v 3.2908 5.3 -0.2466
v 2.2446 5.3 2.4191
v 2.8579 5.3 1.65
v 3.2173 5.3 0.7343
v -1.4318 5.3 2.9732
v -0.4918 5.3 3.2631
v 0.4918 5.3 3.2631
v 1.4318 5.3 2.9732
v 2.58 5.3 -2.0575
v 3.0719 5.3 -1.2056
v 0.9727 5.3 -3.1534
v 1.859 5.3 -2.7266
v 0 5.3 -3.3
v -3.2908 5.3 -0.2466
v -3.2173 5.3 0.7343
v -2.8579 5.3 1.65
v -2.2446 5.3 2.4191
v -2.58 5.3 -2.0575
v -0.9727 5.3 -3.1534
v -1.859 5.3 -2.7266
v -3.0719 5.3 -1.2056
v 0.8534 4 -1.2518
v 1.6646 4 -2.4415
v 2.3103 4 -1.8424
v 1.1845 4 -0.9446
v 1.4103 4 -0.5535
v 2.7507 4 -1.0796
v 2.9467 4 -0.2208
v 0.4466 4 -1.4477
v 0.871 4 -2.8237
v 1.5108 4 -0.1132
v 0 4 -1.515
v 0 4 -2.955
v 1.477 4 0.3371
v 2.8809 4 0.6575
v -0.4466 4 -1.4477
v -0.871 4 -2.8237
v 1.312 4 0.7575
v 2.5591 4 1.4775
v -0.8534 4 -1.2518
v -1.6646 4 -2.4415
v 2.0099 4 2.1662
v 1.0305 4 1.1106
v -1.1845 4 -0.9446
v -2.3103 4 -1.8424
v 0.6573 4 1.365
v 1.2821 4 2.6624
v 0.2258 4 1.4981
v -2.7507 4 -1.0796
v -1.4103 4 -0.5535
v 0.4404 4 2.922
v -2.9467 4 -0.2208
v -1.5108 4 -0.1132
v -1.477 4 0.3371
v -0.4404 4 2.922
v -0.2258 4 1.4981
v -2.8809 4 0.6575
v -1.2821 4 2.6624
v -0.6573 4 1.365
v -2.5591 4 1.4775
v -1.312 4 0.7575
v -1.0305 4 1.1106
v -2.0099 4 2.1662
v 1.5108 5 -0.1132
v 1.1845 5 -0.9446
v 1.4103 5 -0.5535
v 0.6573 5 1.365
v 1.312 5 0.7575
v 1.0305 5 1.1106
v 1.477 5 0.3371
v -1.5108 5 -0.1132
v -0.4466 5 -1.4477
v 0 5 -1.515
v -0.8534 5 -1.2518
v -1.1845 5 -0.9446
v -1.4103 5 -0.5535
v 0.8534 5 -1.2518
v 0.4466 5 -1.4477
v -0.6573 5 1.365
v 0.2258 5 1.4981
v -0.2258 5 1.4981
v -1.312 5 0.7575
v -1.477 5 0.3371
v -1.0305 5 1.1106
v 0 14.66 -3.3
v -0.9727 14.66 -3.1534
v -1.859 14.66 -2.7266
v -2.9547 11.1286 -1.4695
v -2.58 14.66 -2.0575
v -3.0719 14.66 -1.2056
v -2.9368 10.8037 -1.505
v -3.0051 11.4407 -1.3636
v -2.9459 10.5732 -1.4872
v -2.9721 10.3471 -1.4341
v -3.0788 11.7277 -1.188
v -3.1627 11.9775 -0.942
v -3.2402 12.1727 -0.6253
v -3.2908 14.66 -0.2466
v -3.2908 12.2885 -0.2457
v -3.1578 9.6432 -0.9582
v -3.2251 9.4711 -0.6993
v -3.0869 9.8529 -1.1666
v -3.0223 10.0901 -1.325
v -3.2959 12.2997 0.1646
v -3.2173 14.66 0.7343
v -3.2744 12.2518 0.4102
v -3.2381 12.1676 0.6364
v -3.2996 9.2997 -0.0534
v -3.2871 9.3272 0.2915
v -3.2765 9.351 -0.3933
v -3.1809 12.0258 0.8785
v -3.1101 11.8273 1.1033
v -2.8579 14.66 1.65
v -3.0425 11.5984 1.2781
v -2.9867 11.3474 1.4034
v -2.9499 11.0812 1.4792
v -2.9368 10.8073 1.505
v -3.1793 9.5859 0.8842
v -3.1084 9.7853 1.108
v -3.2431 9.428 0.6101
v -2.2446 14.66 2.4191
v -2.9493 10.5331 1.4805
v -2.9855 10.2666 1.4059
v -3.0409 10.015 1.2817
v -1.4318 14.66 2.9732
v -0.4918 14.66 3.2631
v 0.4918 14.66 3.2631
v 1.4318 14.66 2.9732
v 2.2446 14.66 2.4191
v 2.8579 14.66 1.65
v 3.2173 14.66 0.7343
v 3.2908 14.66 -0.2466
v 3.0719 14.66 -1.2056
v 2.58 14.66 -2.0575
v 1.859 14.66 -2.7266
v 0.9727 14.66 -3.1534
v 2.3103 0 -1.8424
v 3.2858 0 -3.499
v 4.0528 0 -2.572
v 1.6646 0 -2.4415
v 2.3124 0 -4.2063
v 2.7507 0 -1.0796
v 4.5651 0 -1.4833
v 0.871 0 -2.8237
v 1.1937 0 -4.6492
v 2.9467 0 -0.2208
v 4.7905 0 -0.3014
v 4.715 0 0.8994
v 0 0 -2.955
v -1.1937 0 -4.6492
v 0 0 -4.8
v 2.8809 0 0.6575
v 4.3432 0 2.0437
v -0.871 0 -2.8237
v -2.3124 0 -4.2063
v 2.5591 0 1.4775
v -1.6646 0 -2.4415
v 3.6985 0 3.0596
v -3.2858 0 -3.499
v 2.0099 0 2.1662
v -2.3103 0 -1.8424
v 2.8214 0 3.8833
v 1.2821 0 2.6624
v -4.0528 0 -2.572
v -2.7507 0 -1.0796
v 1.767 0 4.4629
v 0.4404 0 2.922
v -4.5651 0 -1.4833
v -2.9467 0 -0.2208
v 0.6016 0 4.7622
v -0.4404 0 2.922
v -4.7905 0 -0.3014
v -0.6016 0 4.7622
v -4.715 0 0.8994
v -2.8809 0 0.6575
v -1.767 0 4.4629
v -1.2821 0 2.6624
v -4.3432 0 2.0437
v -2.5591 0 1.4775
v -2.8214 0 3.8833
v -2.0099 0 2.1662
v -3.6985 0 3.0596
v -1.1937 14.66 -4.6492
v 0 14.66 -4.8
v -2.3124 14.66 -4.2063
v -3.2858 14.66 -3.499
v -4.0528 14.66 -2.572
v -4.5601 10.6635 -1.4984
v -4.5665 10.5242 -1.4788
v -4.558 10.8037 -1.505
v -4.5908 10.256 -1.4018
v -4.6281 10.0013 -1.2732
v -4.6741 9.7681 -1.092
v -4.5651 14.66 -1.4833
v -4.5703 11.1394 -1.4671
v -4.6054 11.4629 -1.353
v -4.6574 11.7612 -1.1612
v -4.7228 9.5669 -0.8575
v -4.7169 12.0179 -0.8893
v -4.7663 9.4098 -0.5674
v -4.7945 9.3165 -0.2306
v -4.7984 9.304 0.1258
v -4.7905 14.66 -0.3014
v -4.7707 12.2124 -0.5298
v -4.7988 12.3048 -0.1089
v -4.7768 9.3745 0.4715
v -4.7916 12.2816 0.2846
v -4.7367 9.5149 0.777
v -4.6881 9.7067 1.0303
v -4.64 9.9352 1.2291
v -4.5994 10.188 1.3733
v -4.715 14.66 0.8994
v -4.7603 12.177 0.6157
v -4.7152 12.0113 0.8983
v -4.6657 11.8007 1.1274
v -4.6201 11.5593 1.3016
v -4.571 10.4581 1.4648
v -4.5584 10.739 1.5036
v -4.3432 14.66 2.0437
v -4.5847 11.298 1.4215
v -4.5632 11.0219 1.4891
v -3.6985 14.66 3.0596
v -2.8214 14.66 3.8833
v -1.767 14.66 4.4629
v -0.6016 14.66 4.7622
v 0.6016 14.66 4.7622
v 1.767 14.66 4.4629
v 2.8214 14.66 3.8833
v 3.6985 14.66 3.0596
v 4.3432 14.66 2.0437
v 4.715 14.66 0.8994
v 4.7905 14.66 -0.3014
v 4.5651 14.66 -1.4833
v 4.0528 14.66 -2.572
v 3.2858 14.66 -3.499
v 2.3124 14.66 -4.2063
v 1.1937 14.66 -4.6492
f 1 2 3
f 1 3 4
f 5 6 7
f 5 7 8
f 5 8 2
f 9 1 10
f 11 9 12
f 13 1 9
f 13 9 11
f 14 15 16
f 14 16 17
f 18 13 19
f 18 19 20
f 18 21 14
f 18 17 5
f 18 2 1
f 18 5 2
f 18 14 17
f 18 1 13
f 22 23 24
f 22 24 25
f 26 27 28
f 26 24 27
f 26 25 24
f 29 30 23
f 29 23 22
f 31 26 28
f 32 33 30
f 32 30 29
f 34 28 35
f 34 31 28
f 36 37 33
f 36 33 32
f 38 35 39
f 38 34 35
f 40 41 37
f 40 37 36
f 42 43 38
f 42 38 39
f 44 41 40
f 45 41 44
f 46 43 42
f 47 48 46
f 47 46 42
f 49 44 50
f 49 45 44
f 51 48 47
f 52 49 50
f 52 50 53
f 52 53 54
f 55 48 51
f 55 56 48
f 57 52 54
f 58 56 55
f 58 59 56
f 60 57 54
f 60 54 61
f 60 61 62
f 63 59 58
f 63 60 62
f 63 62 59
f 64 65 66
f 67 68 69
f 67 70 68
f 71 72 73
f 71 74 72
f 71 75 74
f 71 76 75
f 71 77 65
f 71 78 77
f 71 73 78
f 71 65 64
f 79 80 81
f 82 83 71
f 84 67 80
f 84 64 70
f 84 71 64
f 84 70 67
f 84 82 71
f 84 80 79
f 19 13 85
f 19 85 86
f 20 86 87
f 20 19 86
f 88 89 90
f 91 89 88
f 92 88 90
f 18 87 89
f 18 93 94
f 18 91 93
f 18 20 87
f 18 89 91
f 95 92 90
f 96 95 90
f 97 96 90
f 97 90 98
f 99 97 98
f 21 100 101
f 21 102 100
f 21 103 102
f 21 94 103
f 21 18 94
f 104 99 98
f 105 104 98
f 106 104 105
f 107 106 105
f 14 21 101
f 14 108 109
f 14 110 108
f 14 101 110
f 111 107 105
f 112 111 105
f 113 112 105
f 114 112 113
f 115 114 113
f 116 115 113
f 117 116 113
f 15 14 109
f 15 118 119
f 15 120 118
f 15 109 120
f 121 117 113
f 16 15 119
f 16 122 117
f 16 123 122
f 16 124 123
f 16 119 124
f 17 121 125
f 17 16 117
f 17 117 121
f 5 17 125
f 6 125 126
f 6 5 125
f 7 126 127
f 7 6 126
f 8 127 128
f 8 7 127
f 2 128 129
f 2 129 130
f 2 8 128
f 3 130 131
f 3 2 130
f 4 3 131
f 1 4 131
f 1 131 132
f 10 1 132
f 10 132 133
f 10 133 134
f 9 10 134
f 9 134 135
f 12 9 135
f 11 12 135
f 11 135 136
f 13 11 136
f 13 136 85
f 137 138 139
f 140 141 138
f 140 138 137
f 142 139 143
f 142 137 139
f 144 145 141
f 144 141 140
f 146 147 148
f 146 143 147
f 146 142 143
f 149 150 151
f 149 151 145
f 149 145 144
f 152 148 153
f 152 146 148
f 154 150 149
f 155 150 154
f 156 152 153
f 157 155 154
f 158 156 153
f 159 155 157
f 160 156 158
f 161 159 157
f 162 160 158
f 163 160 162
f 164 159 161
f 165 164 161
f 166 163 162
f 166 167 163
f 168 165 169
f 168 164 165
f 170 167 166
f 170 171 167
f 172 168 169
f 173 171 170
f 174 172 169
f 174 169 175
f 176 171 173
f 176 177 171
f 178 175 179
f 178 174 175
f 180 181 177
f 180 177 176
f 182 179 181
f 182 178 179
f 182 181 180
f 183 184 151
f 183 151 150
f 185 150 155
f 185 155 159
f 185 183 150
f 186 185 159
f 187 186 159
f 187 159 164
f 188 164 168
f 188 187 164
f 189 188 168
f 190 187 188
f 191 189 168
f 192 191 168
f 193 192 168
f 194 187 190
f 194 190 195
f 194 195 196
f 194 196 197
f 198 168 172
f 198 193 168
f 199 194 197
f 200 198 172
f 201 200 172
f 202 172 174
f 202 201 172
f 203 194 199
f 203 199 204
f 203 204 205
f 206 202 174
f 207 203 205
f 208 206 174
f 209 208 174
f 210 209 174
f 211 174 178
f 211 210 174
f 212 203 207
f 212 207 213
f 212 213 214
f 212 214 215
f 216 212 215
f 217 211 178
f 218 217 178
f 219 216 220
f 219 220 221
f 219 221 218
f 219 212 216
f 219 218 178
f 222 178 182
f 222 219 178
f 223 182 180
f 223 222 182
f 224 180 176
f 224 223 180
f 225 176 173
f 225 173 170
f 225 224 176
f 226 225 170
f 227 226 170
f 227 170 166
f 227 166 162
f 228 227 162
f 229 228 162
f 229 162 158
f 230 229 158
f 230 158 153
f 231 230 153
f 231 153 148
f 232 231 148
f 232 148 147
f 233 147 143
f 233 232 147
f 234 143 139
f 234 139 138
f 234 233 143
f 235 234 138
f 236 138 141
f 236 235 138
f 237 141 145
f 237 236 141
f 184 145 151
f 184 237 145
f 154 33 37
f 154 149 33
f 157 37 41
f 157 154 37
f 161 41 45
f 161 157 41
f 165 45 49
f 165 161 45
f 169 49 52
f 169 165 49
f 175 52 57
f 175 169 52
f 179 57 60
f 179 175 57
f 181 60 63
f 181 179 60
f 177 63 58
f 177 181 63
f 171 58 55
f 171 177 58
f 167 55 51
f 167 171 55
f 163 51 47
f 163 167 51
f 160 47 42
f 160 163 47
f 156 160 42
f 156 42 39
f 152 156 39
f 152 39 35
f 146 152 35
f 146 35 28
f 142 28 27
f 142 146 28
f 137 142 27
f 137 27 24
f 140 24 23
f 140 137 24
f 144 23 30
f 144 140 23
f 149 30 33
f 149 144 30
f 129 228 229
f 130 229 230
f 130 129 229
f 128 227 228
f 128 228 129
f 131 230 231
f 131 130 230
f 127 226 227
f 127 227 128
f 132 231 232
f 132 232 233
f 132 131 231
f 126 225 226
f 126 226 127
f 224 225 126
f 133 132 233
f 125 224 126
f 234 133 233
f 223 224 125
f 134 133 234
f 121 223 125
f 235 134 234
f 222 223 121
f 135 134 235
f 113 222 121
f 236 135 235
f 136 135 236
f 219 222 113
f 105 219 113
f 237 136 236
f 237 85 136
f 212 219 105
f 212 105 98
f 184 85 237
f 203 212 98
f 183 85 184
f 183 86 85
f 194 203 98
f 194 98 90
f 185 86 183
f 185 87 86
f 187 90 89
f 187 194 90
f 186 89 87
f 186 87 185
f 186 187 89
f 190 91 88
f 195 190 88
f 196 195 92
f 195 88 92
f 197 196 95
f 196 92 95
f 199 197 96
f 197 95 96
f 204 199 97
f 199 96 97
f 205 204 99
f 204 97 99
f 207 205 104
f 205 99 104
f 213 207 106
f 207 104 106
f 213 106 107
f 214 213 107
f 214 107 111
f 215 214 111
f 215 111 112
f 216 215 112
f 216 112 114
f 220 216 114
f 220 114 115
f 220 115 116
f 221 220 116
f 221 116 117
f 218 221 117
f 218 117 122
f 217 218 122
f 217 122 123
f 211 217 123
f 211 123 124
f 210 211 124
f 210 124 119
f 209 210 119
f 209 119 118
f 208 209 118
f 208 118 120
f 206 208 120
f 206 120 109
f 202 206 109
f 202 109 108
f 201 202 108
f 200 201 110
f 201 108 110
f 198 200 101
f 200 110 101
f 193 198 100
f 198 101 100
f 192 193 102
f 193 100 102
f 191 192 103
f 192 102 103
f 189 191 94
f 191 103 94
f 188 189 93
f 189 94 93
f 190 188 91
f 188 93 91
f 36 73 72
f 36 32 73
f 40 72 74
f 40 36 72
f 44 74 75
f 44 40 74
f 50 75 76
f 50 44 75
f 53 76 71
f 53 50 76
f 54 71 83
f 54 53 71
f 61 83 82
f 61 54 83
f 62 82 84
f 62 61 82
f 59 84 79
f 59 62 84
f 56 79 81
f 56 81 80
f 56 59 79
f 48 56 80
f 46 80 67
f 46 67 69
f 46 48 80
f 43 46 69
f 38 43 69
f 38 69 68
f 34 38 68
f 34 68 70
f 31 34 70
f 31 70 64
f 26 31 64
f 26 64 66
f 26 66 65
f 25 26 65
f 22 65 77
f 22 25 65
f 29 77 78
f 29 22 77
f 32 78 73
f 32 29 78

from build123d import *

# Parameters (mm, degrees)
CUT_EXTRUDE1_REACH      = 18.155
CUT_EXTRUDE1_END_RADIUS = 4.8
SKETCH2_R               = 1.505


with BuildPart() as part:
    # Sketch1 → Revolve1 (revolve)
    with BuildSketch(Plane.XY, mode=Mode.PRIVATE) as revolve1_sk:
        Polygon((2.955, 4), (2.955, 0), (4.8, 0), (4.8, 14.66), (3.3, 14.66), (3.3, 5.3), (0, 5.3), (0, 5), (1.515, 5), (1.515, 4), align=None)
    revolve(revolve1_sk.sketch.rotate(Axis((0, 0, 0), (0, 1, 0)), 90), axis=Axis((0, 0, 0), (0, 1, 0)))

    # Cut-Extrude1: up to this cylinder (the profile starts inside it)
    cut_extrude1_end = Plane(origin=(0, 10.803747, 0), z_dir=(0, -1, 0)) * Cylinder(CUT_EXTRUDE1_END_RADIUS, 46.91, mode=Mode.PRIVATE)
    # Sketch2 → Cut-Extrude1 (cut, up to the surface)
    with BuildSketch(Plane(origin=(0, 0, 0), x_dir=(0, 0, -1), z_dir=(1, 0, 0)), mode=Mode.PRIVATE) as cut_extrude1_sk1:
        with Locations((0, 10.803746972)):
            Circle(SKETCH2_R)
    cut_extrude1_tool1 = extrude(cut_extrude1_sk1.sketch, amount=-CUT_EXTRUDE1_REACH, mode=Mode.PRIVATE) & cut_extrude1_end
    add(cut_extrude1_tool1.solids().sort_by_distance((0, 10.803747, 0))[0], mode=Mode.SUBTRACT)


solid = part.part
